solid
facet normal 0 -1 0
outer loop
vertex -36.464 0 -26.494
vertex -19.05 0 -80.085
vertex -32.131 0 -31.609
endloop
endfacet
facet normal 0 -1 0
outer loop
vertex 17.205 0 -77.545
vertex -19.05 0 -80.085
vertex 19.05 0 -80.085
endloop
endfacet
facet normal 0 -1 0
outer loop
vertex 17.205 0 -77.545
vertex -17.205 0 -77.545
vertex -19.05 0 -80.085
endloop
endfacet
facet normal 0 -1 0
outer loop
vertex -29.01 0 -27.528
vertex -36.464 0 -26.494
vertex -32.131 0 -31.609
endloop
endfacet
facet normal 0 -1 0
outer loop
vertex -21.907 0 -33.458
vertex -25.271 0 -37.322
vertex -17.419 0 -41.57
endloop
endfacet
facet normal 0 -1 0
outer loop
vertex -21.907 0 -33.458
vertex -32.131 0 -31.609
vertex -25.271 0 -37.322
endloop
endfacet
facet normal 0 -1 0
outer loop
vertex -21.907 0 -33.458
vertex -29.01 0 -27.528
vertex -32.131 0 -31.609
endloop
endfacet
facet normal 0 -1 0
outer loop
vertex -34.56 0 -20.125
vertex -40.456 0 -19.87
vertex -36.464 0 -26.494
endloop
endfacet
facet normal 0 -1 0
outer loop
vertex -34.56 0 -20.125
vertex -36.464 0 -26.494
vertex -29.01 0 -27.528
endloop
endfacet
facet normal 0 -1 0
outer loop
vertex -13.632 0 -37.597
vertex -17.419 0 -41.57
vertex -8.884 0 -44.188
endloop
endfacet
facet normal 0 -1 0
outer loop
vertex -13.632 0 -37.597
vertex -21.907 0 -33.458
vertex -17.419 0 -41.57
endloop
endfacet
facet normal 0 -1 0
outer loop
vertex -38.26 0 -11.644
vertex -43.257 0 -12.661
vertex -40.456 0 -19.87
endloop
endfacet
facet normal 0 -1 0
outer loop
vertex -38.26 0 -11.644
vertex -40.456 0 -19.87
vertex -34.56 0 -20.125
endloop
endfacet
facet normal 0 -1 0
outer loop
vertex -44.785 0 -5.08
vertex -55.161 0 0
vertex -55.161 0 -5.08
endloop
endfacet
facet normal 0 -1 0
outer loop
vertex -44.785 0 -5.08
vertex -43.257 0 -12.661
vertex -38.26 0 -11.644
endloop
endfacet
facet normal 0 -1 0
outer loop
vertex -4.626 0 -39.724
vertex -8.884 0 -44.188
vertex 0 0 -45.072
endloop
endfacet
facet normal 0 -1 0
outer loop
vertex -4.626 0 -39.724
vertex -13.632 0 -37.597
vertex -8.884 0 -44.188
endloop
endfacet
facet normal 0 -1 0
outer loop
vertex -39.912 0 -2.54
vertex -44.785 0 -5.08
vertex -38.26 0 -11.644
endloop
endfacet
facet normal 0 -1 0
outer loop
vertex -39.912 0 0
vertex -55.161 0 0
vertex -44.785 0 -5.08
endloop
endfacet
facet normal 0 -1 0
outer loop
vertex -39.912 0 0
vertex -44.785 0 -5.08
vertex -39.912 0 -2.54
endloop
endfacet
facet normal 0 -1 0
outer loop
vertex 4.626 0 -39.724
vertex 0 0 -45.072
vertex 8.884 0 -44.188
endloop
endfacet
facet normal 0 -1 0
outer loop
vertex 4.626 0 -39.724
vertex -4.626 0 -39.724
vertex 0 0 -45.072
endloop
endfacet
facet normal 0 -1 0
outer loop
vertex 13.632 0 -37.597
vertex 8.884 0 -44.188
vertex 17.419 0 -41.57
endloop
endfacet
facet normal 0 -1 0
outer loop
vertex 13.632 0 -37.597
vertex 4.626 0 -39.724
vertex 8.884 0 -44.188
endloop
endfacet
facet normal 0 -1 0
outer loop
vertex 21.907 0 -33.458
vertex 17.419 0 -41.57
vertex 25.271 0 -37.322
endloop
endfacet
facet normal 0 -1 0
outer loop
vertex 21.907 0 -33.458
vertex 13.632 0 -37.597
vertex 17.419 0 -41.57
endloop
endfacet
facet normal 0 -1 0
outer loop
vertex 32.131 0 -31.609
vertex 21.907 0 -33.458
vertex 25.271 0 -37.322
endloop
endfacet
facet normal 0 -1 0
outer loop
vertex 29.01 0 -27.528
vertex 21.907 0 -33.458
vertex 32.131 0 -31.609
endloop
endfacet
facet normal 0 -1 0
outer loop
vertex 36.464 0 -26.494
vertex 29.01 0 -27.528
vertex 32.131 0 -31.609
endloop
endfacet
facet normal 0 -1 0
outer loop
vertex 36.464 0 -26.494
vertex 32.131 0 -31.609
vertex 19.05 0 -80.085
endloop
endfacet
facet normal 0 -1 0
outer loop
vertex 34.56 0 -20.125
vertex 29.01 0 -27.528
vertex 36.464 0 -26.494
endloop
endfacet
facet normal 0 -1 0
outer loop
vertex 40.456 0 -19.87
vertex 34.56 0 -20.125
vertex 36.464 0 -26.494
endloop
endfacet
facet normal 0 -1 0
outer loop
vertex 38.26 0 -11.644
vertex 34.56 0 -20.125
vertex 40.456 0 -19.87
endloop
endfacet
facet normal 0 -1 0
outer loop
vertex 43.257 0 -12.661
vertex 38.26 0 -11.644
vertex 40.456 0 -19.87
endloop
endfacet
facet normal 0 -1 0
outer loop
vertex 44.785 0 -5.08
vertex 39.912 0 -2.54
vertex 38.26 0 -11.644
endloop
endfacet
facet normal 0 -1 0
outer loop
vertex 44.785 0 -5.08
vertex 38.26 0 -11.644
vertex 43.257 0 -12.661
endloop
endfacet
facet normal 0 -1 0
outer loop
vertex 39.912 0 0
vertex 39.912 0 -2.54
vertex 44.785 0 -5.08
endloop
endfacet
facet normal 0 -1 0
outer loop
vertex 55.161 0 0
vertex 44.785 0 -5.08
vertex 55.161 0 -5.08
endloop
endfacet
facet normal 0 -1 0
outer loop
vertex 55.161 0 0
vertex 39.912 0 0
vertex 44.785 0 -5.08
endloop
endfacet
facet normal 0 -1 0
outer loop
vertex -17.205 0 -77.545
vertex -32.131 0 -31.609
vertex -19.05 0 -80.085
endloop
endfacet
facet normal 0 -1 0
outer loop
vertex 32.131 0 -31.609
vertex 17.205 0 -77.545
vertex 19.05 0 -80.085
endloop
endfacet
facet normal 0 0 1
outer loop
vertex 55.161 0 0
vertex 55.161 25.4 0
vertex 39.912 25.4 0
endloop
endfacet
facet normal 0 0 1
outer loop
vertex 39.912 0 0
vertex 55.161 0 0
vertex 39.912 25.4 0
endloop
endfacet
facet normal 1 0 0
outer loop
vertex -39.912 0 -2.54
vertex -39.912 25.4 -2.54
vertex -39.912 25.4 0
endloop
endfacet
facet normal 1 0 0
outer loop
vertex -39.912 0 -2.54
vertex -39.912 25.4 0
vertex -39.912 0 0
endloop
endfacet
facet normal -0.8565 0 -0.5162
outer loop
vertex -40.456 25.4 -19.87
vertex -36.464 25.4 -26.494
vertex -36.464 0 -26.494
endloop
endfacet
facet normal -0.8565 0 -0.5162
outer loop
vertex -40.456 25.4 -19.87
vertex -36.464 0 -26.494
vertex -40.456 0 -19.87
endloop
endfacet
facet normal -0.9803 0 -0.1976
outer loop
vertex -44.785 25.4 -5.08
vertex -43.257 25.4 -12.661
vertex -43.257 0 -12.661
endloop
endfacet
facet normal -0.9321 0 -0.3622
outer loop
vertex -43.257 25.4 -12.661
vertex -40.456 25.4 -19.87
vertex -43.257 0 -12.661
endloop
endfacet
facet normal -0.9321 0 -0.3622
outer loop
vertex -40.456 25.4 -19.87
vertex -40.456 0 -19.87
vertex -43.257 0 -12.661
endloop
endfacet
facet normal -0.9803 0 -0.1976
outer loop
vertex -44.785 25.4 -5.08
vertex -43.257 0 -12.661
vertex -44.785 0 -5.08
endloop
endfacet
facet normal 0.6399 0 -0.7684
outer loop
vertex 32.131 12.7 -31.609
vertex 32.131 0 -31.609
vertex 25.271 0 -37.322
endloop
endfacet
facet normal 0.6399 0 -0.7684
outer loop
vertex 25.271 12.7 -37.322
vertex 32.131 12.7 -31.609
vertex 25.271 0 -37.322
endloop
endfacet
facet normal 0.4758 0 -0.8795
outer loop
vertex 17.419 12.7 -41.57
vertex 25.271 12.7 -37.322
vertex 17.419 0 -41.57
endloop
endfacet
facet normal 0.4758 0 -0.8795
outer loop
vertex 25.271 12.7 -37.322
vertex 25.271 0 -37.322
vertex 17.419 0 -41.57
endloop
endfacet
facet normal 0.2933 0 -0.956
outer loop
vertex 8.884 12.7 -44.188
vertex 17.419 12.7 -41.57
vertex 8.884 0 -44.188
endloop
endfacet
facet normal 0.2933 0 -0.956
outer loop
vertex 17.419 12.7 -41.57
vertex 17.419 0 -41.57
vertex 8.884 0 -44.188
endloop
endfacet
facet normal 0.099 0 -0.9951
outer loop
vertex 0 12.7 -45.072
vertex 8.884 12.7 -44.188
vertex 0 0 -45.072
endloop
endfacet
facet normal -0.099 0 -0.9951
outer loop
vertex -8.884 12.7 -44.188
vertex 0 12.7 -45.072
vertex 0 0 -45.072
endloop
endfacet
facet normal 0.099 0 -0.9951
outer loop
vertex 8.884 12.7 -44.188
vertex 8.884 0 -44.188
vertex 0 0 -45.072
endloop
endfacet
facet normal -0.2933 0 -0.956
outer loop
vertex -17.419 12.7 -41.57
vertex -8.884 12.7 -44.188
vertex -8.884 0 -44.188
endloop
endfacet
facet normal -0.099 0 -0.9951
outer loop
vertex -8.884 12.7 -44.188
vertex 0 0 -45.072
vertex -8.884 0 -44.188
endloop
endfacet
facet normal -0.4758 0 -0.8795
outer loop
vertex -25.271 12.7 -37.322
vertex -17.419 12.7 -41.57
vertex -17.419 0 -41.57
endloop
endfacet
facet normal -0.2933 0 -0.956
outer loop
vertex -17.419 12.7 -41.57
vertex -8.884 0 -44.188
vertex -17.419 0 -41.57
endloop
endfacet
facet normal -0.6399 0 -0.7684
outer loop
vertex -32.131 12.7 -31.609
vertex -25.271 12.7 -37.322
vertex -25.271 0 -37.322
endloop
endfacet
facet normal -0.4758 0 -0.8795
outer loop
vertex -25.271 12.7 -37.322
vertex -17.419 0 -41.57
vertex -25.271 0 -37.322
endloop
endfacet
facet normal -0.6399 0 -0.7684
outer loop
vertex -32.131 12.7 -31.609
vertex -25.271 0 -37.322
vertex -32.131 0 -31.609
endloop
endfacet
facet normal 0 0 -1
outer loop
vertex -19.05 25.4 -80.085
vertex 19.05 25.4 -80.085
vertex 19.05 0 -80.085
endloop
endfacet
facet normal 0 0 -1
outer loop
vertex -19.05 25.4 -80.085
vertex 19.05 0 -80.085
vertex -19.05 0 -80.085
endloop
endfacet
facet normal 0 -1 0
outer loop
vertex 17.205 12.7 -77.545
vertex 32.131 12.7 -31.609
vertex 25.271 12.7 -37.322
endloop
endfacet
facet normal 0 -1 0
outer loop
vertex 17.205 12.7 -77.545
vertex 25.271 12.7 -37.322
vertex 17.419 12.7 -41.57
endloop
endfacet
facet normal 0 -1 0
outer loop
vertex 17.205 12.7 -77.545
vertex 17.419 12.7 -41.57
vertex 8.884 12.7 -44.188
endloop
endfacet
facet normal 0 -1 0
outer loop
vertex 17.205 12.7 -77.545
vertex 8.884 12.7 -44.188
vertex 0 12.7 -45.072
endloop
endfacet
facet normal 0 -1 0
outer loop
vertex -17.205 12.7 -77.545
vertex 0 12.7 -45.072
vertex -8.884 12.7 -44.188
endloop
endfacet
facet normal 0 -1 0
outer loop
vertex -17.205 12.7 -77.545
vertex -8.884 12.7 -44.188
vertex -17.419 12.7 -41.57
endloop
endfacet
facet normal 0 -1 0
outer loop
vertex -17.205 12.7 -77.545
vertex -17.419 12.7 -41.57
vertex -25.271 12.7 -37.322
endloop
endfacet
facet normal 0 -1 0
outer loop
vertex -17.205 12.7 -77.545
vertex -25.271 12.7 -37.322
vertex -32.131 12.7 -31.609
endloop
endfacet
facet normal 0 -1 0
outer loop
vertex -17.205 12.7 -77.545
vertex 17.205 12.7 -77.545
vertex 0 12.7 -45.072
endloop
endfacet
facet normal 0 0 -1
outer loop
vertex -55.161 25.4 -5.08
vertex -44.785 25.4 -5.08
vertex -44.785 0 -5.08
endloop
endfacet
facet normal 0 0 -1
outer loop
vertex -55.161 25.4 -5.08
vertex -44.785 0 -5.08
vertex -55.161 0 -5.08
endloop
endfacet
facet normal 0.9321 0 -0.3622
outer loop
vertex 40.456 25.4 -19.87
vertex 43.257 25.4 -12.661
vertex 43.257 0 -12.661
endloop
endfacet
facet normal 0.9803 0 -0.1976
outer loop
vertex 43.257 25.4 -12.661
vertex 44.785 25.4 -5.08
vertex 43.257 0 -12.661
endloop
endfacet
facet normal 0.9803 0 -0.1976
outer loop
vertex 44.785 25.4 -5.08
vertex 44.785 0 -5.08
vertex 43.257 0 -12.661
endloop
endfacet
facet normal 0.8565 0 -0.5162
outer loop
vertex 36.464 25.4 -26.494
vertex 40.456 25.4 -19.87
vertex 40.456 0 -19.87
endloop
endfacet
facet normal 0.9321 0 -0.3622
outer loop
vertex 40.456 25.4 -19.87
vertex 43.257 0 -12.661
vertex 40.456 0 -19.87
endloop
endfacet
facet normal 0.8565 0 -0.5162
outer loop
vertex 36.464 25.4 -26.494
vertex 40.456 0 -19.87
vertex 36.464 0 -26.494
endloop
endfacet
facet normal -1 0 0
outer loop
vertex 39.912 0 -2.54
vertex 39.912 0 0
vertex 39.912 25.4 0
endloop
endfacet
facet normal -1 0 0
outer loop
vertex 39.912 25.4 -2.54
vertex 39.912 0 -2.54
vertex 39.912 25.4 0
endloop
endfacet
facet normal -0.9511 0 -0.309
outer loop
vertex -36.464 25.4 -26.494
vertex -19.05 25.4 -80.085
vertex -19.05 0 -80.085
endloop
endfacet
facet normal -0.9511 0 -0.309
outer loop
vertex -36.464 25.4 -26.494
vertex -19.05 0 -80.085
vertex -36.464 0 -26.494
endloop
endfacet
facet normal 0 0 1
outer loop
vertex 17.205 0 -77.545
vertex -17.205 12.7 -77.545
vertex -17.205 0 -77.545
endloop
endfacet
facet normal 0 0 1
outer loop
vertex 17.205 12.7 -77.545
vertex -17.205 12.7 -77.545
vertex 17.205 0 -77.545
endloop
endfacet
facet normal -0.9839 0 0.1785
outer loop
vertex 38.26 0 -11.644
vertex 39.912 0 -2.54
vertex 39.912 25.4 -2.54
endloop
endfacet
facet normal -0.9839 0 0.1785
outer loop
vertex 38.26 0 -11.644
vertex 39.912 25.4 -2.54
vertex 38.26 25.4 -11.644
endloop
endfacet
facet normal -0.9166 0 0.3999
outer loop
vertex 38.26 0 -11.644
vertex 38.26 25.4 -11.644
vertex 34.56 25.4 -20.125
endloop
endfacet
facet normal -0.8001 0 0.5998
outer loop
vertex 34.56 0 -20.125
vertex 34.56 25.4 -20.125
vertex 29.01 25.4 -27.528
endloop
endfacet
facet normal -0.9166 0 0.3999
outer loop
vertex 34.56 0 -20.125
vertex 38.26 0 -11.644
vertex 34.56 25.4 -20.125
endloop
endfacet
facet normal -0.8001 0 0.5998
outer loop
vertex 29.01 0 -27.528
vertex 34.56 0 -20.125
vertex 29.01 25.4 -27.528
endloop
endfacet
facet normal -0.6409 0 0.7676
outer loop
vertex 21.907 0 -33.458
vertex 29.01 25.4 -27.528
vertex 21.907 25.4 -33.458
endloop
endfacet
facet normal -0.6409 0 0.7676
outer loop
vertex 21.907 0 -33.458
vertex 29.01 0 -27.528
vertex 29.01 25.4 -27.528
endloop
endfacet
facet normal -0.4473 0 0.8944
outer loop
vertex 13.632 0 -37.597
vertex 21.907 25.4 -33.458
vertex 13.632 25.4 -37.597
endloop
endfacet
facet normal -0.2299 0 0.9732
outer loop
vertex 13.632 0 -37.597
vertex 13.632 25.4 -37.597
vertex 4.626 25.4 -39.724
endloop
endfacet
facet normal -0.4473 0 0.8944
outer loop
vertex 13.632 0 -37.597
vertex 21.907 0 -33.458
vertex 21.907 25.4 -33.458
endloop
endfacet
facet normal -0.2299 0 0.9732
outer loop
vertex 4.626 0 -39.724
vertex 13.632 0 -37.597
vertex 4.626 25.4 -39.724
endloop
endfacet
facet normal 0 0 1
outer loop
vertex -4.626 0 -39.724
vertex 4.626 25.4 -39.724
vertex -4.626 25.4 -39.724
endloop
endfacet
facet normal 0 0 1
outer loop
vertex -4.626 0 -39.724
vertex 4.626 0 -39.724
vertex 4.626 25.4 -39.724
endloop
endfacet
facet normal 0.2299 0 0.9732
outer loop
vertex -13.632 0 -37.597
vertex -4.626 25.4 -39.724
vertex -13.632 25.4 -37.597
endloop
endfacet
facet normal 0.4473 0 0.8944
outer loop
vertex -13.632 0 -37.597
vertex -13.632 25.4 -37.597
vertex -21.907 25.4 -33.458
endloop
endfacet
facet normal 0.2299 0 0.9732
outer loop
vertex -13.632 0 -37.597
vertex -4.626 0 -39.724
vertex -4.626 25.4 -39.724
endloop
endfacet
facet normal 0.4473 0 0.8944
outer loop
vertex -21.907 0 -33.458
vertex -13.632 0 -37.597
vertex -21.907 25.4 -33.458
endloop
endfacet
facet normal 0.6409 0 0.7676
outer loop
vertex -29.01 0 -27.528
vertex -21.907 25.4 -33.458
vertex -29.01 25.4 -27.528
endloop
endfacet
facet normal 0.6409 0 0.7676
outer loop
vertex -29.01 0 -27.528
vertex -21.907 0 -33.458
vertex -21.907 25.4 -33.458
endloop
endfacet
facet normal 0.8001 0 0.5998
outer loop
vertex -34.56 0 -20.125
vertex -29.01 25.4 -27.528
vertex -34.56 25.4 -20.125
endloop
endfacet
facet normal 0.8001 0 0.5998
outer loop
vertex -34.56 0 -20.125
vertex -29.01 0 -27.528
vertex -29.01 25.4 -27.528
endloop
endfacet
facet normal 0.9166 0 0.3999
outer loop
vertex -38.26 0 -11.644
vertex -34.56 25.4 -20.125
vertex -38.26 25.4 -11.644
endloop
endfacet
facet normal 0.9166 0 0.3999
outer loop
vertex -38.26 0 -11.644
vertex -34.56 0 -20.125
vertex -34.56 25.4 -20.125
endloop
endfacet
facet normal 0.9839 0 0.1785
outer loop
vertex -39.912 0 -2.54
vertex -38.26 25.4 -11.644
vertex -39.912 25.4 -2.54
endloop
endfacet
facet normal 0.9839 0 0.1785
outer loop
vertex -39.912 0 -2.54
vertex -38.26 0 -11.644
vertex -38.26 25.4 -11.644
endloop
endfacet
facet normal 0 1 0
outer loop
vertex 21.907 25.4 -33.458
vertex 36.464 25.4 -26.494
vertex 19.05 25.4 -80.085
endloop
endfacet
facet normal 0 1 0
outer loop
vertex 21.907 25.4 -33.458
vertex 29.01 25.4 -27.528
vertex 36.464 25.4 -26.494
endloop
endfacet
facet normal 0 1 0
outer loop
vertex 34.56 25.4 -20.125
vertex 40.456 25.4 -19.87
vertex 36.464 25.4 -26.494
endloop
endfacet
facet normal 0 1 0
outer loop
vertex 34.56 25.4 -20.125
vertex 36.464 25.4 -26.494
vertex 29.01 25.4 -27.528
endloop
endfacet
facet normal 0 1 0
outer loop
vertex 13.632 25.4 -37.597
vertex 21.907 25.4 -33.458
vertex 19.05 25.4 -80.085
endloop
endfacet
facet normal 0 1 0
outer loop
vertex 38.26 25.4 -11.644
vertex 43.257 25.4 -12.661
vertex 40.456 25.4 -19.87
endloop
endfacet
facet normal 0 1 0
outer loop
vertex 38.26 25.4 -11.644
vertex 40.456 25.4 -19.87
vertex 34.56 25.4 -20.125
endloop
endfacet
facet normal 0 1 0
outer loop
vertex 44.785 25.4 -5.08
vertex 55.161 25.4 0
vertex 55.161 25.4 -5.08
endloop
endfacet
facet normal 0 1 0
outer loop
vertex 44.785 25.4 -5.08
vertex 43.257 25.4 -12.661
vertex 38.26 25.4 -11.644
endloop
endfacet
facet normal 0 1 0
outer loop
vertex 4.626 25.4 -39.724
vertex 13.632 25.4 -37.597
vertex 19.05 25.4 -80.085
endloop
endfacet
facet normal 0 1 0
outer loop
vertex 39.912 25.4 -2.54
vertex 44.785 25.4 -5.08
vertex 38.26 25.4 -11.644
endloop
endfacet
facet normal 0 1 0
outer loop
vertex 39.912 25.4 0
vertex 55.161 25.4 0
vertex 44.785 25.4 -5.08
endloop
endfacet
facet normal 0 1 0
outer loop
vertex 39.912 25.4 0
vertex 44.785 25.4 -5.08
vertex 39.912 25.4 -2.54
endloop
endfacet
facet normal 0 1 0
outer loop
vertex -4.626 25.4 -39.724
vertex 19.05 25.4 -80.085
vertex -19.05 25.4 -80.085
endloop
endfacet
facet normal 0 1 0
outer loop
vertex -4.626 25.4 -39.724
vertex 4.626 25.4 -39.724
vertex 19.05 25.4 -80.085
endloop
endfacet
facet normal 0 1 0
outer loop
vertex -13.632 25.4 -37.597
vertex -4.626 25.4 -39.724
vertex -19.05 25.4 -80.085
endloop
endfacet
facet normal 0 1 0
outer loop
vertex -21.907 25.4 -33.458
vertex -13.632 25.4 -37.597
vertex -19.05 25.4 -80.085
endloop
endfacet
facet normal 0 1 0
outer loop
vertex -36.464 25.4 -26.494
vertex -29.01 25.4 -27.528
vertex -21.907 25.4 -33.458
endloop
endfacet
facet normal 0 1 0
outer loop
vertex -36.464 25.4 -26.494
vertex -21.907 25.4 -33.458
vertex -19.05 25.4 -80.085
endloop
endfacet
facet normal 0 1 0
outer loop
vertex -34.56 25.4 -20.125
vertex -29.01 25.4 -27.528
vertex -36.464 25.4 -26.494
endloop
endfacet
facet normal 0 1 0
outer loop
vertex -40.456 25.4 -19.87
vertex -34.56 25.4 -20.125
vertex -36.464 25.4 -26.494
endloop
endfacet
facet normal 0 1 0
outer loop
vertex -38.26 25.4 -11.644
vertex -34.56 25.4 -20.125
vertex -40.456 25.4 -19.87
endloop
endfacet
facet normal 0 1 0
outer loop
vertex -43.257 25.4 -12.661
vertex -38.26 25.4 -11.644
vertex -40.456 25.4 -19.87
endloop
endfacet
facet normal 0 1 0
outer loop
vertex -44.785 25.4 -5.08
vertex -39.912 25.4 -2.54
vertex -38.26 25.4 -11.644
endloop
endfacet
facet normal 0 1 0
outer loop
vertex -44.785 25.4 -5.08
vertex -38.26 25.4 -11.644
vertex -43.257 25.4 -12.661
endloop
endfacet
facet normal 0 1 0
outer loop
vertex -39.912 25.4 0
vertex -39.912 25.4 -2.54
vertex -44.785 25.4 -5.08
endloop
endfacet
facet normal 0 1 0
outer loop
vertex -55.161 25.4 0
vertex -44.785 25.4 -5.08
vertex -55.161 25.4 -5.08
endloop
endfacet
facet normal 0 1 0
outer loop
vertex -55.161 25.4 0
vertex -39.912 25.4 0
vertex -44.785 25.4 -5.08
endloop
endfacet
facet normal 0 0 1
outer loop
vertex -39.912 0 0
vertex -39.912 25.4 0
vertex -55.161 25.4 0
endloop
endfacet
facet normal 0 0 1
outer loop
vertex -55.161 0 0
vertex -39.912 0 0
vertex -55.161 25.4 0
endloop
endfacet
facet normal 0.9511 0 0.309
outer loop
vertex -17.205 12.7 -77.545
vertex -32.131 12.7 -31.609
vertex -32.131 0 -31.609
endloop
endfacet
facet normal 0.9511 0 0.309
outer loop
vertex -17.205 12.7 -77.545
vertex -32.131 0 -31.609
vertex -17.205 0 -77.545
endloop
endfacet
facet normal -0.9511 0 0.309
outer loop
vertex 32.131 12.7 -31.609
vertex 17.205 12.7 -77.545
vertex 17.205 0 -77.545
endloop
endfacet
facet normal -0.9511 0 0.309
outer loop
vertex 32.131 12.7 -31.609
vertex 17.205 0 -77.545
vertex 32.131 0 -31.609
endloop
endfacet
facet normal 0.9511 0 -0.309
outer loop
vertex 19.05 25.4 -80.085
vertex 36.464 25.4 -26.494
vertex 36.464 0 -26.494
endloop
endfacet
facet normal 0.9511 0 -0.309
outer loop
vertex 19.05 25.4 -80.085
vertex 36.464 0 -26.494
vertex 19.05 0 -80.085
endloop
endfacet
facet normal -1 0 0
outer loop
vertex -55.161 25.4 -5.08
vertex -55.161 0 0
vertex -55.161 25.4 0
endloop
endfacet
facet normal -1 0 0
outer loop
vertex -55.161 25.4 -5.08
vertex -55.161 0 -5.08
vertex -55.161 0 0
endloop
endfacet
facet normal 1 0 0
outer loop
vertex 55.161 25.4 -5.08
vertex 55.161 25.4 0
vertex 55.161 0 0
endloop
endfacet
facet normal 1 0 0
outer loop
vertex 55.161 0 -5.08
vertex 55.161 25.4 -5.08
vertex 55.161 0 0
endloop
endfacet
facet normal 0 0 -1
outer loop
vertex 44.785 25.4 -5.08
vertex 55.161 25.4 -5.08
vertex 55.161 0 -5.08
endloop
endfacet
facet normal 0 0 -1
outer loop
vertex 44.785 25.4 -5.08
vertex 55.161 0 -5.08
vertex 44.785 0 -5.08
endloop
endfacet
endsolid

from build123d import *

# Parameters (mm, degrees)
SKETCH1_R               = 45.0723
SKETCH1_R_2             = 39.9923
BOSS_EXTRUDE1_DEPTH     = 25.4
BOSS_EXTRUDE2_DEPTH     = 12.7
BOSS_EXTRUDE3_DEPTH     = 12.7
SKETCH4_W               = 90.1446
SKETCH4_H               = 25.4
CUT_EXTRUDE1_DEPTH      = 46.0723
CUT_EXTRUDE1_DEPTH_BACK = 2.54
BOSS_EXTRUDE4_DEPTH     = 2.54


with BuildPart() as part:
    # Sketch1 → Boss-Extrude1 (new body)
    with BuildSketch(Plane(origin=(0, 0, 0), x_dir=(1, 0, 0), z_dir=(0, 1, 0))):
        Circle(SKETCH1_R)
        Circle(SKETCH1_R_2, mode=Mode.SUBTRACT)
    extrude(amount=BOSS_EXTRUDE1_DEPTH)

    # Sketch2 → Boss-Extrude2 (add, symmetric)
    with BuildSketch(Plane(origin=(0, 12.7, 0), x_dir=(1, 0, 0), z_dir=(0, 1, 0))):
        Polygon((45.0723, 0), (19.05, 80.085348852), (-19.05, 80.085348852), (-45.0723, 0), (-42.65662525, -0.784930252), (-17.204603736, 77.545348852), (17.204603736, 77.545348852), (42.65662525, -0.784930252), align=None)
    extrude(amount=BOSS_EXTRUDE2_DEPTH, both=True)

    # Sketch3 → Boss-Extrude3 (add)
    with BuildSketch(Plane(origin=(0, 25.4, 0), x_dir=(1, 0, 0), z_dir=(0, 1, 0))):
        with BuildLine():
            Line((-17.204603736, 77.545348852), (17.204603736, 77.545348852))
            Line((17.204603736, 77.545348852), (32.130834652, 31.60888628))
            ThreePointArc((32.130834652, 31.60888628), (0, 45.0723), (-32.130834652, 31.60888628))
            Line((-32.130834652, 31.60888628), (-17.204603736, 77.545348852))
        make_face()
    extrude(amount=-BOSS_EXTRUDE3_DEPTH)

    # Sketch4 → Cut-Extrude1 (cut, two sides)
    with BuildSketch(Plane.XY) as cut_extrude1_sk:
        with Locations((0, 12.7)):
            Rectangle(SKETCH4_W, SKETCH4_H)
    extrude(amount=CUT_EXTRUDE1_DEPTH, mode=Mode.SUBTRACT)
    extrude(cut_extrude1_sk.sketch, amount=-CUT_EXTRUDE1_DEPTH_BACK, mode=Mode.SUBTRACT)

    # Sketch5 → Boss-Extrude4 (add, symmetric)
    with BuildSketch(Plane.XY.offset(-2.54)):
        Polygon((-45.000673632, 25.4), (-39.911557966, 25.4), (-39.911557966, 0), (-45.086454025, 0), (-55.160673632, 0), (-55.160673632, 25.4), align=None)
        Polygon((55.160673632, 25.4), (55.160673632, 0), (45.086454025, 0), (39.911557966, 0), (39.911557966, 25.4), (45.000673632, 25.4), align=None)
    extrude(amount=BOSS_EXTRUDE4_DEPTH, both=True)


solid = part.part
